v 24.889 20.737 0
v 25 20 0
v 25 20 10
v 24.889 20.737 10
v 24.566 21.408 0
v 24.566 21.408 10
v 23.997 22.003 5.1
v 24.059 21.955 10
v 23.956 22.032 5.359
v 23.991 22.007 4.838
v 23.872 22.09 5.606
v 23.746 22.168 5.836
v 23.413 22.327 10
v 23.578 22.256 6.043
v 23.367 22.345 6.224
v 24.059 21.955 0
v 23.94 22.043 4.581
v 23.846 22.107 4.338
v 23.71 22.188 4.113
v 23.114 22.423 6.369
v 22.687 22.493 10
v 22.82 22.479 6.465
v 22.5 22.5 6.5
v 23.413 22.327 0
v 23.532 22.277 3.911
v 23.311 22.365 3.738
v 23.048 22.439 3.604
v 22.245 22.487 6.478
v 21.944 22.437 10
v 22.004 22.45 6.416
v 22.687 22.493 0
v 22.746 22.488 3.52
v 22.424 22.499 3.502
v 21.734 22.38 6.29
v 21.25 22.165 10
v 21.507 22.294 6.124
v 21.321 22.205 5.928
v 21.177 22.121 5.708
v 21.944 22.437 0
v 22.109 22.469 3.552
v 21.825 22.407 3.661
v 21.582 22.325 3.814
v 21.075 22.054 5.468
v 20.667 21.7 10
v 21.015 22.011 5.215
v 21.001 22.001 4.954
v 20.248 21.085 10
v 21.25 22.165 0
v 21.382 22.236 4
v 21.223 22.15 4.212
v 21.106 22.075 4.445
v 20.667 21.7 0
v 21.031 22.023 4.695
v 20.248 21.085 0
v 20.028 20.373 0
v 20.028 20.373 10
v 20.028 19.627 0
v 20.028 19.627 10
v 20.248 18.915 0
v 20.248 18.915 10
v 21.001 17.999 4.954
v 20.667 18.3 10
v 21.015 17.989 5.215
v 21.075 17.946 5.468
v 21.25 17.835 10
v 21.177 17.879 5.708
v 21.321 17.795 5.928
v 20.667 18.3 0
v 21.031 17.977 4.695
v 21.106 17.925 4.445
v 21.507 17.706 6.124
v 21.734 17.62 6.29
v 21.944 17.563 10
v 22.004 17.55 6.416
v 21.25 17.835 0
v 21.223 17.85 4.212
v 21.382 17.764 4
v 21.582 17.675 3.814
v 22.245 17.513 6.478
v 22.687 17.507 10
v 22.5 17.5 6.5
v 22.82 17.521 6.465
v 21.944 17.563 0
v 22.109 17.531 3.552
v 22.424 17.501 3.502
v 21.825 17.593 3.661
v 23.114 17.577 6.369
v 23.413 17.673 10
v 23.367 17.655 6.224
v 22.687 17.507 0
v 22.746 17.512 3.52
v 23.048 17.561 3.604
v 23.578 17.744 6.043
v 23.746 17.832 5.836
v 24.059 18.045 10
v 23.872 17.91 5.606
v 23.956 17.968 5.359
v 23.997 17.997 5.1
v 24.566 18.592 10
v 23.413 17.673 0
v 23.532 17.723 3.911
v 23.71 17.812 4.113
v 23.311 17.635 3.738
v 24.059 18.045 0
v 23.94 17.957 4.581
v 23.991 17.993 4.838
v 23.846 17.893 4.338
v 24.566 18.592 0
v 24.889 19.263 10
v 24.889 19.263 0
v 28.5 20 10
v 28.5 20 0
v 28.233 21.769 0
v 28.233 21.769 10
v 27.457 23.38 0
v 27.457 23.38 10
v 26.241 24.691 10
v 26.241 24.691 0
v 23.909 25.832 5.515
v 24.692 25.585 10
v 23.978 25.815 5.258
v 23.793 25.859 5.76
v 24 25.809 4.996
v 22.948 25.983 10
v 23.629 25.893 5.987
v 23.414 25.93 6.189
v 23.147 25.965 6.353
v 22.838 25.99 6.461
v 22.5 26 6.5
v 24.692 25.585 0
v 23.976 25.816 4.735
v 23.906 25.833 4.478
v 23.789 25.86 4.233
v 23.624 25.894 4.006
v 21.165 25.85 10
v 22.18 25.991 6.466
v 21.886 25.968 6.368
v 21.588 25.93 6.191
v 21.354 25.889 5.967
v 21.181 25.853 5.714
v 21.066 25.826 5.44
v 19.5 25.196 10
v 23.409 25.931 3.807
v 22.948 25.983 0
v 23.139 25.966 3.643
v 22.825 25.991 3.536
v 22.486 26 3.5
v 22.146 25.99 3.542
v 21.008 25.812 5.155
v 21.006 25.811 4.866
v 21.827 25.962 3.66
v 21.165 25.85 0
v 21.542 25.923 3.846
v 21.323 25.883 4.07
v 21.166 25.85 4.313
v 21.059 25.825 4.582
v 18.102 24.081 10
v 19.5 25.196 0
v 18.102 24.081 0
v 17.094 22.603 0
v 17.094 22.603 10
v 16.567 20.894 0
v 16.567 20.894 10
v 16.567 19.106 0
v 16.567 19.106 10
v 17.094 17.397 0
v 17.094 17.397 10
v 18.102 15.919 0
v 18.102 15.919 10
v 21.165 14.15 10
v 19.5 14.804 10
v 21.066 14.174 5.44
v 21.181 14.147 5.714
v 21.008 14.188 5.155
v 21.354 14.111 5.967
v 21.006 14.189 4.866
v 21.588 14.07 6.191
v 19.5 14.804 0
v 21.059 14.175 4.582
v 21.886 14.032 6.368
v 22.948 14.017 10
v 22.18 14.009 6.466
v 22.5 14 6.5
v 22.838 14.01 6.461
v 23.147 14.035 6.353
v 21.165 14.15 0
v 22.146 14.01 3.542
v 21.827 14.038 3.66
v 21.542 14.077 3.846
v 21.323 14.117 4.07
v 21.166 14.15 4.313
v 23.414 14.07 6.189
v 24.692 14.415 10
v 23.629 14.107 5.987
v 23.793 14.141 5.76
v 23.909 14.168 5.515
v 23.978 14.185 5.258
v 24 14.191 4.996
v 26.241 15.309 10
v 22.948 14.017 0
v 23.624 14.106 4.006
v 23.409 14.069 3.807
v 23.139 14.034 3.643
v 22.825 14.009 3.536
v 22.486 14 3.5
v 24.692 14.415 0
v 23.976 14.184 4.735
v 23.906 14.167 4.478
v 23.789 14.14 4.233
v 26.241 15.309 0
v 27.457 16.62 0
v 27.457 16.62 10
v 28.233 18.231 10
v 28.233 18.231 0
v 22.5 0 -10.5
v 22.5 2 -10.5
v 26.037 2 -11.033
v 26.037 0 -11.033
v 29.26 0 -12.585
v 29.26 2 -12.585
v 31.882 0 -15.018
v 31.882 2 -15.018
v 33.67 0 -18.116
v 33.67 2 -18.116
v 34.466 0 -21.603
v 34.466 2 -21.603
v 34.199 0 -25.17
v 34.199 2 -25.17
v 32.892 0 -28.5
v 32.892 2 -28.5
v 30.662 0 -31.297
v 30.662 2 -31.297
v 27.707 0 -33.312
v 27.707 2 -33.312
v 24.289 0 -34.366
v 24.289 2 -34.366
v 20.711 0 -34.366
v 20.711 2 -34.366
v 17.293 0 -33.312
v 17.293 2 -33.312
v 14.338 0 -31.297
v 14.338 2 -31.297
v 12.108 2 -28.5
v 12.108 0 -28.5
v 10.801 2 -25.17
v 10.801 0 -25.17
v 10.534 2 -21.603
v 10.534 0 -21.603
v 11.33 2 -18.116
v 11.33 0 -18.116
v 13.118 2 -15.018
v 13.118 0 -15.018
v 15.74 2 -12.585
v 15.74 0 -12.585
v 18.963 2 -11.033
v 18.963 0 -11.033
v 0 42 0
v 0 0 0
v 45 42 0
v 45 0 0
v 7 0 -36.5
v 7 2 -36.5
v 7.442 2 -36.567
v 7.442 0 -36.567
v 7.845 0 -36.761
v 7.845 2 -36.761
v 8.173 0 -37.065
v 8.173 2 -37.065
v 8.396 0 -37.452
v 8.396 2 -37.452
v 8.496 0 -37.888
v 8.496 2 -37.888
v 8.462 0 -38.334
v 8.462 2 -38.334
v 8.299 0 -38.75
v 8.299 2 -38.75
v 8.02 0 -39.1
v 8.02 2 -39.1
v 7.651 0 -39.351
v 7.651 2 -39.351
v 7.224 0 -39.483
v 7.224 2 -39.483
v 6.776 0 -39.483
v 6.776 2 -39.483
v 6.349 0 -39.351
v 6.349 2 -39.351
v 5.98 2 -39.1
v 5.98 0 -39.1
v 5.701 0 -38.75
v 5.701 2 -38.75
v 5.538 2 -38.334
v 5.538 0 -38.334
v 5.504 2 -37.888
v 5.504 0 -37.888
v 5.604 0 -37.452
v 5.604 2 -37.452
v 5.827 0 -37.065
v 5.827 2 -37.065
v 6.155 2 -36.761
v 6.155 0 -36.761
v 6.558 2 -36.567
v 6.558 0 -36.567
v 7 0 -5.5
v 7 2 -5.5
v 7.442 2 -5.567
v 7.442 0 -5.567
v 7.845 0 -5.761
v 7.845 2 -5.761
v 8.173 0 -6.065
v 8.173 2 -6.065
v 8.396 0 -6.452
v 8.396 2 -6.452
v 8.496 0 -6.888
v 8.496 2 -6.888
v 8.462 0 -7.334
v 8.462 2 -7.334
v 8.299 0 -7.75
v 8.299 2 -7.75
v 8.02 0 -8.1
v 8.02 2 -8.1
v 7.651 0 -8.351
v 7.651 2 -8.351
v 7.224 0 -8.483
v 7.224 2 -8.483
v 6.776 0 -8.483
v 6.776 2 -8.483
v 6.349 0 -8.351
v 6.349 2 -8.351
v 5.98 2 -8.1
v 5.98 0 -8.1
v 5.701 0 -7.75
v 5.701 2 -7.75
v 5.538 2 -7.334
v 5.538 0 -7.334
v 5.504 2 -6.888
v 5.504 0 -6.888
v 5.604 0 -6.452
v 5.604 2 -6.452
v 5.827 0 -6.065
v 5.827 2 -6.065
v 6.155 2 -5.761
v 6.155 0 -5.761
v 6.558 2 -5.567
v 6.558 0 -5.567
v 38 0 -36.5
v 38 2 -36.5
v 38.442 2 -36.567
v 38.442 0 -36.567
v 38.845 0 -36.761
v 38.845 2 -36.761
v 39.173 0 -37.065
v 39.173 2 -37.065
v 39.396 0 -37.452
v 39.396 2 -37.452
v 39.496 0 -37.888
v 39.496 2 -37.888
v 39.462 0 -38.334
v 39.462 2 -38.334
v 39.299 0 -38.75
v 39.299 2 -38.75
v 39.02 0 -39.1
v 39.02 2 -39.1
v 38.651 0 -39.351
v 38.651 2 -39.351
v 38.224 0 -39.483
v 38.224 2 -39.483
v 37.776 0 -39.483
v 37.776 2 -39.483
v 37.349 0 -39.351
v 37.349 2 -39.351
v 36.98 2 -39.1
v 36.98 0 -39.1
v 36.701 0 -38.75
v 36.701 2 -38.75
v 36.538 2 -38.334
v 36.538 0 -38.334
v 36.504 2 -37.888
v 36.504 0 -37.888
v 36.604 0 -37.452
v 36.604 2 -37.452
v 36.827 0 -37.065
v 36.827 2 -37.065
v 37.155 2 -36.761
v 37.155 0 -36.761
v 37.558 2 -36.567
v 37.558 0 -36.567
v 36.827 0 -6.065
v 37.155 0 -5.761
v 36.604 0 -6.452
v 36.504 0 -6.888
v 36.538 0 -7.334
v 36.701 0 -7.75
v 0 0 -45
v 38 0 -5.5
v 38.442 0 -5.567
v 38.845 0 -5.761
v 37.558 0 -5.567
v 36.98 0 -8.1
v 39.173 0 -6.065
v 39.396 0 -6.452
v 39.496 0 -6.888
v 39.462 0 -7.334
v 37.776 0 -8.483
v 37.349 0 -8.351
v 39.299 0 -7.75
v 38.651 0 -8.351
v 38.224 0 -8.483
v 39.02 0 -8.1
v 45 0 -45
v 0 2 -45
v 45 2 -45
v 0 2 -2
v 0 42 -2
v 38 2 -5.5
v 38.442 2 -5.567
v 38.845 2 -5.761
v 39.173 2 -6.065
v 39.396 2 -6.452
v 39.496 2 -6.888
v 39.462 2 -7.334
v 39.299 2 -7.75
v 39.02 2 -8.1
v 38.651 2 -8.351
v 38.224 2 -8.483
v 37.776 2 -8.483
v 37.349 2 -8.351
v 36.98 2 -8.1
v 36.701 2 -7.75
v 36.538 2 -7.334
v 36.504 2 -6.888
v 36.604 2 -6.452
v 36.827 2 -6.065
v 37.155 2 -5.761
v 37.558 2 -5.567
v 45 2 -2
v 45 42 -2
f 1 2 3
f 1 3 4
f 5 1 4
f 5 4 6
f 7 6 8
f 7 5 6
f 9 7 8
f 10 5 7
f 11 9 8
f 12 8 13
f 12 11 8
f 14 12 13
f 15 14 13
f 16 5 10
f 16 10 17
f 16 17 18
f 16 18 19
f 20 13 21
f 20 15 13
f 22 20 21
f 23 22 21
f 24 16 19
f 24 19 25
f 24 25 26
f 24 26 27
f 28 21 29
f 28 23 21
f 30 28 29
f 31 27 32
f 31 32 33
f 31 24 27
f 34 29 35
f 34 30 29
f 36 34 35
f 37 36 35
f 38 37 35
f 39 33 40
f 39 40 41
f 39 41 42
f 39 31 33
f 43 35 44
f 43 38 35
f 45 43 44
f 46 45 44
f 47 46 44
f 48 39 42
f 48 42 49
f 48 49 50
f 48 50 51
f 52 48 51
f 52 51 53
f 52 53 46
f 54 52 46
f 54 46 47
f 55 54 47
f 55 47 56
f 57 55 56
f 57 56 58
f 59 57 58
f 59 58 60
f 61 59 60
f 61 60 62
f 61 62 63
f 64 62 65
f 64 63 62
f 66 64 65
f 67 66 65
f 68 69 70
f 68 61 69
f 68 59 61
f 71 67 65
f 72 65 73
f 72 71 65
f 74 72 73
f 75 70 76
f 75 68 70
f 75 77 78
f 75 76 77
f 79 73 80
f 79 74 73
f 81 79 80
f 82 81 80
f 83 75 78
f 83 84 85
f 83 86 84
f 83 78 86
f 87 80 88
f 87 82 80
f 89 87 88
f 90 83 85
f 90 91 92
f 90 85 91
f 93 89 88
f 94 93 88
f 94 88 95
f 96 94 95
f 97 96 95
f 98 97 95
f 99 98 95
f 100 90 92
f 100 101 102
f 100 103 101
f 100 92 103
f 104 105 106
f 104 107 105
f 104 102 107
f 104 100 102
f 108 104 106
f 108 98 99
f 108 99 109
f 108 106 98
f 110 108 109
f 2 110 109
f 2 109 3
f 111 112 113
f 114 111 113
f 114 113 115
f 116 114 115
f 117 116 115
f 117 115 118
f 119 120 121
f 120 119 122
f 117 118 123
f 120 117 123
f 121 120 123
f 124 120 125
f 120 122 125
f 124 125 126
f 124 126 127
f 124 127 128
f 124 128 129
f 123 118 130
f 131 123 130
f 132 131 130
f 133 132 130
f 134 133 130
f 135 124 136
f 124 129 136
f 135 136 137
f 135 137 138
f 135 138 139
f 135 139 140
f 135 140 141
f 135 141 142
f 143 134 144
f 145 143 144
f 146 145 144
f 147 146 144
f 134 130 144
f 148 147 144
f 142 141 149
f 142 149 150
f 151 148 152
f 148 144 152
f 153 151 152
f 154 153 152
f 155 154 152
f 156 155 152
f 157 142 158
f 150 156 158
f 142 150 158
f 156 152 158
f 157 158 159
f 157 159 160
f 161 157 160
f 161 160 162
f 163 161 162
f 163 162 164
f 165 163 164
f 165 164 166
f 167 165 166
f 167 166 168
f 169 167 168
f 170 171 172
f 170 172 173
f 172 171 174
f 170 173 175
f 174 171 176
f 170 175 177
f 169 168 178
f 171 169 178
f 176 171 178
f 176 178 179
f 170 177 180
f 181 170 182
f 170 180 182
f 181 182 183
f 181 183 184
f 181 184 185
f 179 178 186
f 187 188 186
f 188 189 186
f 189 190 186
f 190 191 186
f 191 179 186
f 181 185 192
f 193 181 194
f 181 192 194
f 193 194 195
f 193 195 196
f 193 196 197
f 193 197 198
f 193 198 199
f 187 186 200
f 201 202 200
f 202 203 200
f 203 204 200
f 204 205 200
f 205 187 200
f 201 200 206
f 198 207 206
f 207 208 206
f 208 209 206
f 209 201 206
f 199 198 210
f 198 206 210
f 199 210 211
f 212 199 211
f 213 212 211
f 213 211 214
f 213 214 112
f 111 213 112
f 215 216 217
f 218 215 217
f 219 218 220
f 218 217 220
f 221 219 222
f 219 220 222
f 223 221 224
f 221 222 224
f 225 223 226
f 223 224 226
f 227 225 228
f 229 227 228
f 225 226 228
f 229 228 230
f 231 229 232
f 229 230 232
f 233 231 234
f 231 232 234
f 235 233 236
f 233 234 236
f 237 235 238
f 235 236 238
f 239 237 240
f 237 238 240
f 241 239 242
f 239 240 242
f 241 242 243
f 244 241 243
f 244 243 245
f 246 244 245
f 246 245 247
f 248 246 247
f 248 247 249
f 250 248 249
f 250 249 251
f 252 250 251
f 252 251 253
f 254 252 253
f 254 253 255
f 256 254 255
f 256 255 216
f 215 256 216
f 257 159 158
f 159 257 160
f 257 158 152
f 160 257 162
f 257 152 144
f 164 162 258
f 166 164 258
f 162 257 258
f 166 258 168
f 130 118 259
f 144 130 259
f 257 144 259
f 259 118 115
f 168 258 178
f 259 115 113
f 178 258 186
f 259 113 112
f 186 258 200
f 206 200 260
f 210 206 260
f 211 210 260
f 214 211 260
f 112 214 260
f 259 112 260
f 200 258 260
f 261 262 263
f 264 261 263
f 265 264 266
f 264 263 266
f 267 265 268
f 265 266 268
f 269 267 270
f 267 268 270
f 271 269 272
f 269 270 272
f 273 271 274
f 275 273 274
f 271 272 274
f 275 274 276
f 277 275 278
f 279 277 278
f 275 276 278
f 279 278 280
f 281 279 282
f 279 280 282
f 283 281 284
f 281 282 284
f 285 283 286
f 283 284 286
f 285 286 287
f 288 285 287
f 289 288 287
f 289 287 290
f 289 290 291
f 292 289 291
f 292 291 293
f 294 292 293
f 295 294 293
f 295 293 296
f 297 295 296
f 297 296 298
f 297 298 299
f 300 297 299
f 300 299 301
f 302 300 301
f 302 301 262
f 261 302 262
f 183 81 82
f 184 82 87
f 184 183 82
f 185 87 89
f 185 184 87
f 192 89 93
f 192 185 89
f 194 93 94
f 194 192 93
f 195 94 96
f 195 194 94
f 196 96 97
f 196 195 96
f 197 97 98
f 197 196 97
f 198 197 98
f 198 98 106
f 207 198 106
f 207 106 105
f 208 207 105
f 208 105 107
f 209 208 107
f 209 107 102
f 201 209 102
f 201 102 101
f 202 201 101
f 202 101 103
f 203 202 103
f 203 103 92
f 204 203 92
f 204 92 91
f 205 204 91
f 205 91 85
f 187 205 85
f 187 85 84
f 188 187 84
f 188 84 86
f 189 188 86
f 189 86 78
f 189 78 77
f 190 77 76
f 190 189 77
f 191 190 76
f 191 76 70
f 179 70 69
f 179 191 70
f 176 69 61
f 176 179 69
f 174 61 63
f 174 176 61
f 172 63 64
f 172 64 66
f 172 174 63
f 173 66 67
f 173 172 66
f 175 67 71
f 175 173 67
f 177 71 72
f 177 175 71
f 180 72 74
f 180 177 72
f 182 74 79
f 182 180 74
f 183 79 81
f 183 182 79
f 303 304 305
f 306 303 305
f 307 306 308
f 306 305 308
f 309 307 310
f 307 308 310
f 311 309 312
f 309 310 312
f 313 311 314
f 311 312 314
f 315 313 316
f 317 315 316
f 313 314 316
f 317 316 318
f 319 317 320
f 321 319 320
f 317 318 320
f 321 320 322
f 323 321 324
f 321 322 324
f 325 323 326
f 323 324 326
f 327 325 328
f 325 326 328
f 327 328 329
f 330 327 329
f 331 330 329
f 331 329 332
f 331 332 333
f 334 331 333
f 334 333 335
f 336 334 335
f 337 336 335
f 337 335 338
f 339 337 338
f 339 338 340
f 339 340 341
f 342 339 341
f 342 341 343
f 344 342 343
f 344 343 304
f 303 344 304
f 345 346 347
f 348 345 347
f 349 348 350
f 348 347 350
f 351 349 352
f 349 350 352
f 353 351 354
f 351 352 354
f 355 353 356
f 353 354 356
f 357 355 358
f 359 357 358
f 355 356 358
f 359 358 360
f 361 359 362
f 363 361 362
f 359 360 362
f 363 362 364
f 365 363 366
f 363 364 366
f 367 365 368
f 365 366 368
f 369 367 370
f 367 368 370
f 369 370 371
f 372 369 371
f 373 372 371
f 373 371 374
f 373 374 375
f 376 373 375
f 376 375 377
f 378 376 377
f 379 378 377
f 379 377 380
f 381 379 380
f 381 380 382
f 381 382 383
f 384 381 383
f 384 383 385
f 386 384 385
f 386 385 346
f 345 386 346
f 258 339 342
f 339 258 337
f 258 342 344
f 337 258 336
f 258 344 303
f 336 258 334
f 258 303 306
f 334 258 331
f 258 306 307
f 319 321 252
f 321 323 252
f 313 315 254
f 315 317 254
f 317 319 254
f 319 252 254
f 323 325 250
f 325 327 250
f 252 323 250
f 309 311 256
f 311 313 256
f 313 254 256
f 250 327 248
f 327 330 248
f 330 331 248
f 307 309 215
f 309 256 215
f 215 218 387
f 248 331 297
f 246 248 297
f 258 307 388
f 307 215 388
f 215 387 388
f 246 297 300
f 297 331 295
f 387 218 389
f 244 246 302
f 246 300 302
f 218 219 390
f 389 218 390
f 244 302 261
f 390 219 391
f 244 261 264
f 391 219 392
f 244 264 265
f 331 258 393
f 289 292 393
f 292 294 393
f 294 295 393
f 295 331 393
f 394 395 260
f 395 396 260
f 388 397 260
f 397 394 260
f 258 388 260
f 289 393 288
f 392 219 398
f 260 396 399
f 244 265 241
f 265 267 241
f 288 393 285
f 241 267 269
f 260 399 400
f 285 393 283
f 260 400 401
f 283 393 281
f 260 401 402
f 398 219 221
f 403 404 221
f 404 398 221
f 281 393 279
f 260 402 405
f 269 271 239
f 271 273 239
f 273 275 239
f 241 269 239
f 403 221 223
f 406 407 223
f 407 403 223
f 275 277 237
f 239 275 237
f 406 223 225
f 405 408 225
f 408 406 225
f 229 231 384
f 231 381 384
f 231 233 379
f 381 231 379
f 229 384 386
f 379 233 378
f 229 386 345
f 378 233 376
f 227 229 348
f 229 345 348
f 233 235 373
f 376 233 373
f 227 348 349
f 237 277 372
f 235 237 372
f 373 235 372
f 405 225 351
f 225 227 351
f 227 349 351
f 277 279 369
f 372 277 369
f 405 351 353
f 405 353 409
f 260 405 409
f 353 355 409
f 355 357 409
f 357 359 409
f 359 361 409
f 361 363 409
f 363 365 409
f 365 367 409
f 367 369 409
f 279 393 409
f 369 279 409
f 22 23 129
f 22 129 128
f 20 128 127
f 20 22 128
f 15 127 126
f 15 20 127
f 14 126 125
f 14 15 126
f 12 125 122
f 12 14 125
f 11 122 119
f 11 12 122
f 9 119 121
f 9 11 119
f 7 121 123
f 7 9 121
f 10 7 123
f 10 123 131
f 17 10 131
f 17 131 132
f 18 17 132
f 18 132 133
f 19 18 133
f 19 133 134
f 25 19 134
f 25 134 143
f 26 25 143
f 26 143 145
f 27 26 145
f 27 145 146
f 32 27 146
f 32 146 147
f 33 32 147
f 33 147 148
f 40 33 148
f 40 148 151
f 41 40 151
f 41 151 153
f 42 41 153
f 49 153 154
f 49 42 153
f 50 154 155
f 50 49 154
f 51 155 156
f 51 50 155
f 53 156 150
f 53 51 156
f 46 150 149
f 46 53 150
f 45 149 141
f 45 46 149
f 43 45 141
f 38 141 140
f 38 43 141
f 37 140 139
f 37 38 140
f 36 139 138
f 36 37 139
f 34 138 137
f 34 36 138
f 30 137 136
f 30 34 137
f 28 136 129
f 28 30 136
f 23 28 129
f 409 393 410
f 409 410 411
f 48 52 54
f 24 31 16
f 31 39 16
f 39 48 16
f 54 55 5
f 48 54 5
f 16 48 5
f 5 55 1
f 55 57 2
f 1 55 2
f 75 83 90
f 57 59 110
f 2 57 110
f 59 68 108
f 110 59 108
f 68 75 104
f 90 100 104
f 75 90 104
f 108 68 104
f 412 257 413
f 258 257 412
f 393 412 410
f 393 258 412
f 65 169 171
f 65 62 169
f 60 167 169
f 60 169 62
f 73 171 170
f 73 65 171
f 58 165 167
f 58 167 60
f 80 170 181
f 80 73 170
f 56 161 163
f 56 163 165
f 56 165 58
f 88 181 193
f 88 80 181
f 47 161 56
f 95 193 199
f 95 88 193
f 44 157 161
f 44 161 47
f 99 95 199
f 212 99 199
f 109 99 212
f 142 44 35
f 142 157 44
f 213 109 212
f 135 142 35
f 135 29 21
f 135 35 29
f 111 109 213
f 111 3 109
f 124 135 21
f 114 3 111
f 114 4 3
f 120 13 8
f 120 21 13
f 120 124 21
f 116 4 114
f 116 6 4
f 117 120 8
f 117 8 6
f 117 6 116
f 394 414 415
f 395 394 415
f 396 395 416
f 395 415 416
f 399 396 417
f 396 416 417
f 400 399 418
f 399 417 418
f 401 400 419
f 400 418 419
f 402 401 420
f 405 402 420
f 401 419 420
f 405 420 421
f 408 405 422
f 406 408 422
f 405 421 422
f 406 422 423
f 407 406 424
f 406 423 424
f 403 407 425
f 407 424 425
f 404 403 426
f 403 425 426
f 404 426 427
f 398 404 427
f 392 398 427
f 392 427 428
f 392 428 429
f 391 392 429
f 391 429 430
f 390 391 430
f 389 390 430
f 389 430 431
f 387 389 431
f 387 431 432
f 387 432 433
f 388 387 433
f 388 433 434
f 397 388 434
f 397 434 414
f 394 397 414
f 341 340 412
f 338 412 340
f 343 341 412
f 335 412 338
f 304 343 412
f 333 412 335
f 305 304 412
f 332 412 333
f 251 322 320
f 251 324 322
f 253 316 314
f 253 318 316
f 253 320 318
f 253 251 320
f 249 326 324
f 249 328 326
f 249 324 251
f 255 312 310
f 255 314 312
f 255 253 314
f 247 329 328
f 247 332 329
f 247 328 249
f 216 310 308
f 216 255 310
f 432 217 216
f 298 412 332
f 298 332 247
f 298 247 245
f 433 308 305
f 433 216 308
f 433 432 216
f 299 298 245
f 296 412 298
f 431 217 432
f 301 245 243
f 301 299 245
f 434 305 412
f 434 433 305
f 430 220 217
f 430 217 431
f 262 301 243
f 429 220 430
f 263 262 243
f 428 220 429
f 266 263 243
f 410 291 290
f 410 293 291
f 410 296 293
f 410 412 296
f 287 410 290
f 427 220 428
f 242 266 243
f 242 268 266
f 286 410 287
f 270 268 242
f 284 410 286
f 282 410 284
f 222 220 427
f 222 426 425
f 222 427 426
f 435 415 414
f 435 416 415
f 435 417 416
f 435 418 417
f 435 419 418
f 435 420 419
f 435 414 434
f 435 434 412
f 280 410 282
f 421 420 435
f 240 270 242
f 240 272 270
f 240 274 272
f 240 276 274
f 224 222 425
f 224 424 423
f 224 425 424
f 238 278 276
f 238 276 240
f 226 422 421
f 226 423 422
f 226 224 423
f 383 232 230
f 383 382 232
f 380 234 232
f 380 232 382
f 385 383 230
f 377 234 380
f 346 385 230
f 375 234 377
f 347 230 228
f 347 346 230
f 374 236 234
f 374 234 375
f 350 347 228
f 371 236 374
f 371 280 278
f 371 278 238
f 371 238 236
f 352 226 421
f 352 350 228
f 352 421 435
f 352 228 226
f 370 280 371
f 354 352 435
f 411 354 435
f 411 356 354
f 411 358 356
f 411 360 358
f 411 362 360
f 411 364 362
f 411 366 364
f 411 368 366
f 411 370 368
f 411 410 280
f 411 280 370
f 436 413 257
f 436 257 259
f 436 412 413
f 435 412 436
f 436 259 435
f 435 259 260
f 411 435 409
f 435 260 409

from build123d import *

# Parameters (mm, degrees)
SKETCH_1_W               = 45
SKETCH_1_H               = 45
EXTRUDE_1_DEPTH          = 2
SKETCH_3_R               = 12
SKETCH_3_R_2             = 1.5
CUT_EXTRUDE_1_DEPTH      = 10
SKETCH_7_W               = 45
SKETCH_7_H               = 2
EXTRUDE_3_DEPTH          = 40
SKETCH_8_R               = 6
SKETCH_8_R_2             = 2.5
EXTRUDE_4_DEPTH          = 10
CUT_EXTRUDE_2_DEPTH      = 77.249590163
CUT_EXTRUDE_2_DEPTH_BACK = 77.249590163
SKETCH_9_R               = 1.5


with BuildPart() as part:
    # 草图1 → 凸台-拉伸1 (new body)
    with BuildSketch(Plane(origin=(0, 0, 0), x_dir=(1, 0, 0), z_dir=(0, 1, 0))):
        with Locations((22.5, 22.5)):
            Rectangle(SKETCH_1_W, SKETCH_1_H)
    extrude(amount=EXTRUDE_1_DEPTH)

    # 草图3 → 切除-拉伸1 (cut)
    with BuildSketch(Plane(origin=(0, 2, 0), x_dir=(1, 0, 0), z_dir=(0, 1, 0))):
        with Locations(Location((22.5, 22.5, 0), (0, 0, 270))):
            Circle(SKETCH_3_R)
        with Locations(Location((38, 38, 0), (0, 0, 270))):
            Circle(SKETCH_3_R_2)
        with Locations(Location((7, 38, 0), (0, 0, 270))):
            Circle(SKETCH_3_R_2)
        with Locations(Location((7, 7, 0), (0, 0, 270))):
            Circle(SKETCH_3_R_2)
        with Locations(Location((38, 7, 0), (0, 0, 270))):
            Circle(SKETCH_3_R_2)
    extrude(amount=-CUT_EXTRUDE_1_DEPTH, mode=Mode.SUBTRACT)

    # 草图7 → 凸台-拉伸3 (add)
    with BuildSketch(Plane(origin=(0, 2, 0), x_dir=(1, 0, 0), z_dir=(0, 1, 0))):
        with Locations((22.5, 1)):
            Rectangle(SKETCH_7_W, SKETCH_7_H)
    extrude(amount=EXTRUDE_3_DEPTH)

    # 草图8 → 凸台-拉伸4 (add)
    with BuildSketch(Plane.XY):
        with Locations((22.5, 20)):
            Circle(SKETCH_8_R)
        with Locations((22.5, 20)):
            Circle(SKETCH_8_R_2, mode=Mode.SUBTRACT)
    extrude(amount=EXTRUDE_4_DEPTH)

    # 草图9 → 切除-拉伸2 (cut, two sides: drawn at the far end of the back side and taken through both)
    with BuildSketch(Plane(origin=(0, 0, 0), x_dir=(1, 0, 0), z_dir=(0, 1, 0)).offset(-CUT_EXTRUDE_2_DEPTH_BACK)):
        with Locations(Location((22.5, -5, 0), (0, 0, 270))):
            Circle(SKETCH_9_R)
    extrude(amount=CUT_EXTRUDE_2_DEPTH + CUT_EXTRUDE_2_DEPTH_BACK, mode=Mode.SUBTRACT)


solid = part.part
